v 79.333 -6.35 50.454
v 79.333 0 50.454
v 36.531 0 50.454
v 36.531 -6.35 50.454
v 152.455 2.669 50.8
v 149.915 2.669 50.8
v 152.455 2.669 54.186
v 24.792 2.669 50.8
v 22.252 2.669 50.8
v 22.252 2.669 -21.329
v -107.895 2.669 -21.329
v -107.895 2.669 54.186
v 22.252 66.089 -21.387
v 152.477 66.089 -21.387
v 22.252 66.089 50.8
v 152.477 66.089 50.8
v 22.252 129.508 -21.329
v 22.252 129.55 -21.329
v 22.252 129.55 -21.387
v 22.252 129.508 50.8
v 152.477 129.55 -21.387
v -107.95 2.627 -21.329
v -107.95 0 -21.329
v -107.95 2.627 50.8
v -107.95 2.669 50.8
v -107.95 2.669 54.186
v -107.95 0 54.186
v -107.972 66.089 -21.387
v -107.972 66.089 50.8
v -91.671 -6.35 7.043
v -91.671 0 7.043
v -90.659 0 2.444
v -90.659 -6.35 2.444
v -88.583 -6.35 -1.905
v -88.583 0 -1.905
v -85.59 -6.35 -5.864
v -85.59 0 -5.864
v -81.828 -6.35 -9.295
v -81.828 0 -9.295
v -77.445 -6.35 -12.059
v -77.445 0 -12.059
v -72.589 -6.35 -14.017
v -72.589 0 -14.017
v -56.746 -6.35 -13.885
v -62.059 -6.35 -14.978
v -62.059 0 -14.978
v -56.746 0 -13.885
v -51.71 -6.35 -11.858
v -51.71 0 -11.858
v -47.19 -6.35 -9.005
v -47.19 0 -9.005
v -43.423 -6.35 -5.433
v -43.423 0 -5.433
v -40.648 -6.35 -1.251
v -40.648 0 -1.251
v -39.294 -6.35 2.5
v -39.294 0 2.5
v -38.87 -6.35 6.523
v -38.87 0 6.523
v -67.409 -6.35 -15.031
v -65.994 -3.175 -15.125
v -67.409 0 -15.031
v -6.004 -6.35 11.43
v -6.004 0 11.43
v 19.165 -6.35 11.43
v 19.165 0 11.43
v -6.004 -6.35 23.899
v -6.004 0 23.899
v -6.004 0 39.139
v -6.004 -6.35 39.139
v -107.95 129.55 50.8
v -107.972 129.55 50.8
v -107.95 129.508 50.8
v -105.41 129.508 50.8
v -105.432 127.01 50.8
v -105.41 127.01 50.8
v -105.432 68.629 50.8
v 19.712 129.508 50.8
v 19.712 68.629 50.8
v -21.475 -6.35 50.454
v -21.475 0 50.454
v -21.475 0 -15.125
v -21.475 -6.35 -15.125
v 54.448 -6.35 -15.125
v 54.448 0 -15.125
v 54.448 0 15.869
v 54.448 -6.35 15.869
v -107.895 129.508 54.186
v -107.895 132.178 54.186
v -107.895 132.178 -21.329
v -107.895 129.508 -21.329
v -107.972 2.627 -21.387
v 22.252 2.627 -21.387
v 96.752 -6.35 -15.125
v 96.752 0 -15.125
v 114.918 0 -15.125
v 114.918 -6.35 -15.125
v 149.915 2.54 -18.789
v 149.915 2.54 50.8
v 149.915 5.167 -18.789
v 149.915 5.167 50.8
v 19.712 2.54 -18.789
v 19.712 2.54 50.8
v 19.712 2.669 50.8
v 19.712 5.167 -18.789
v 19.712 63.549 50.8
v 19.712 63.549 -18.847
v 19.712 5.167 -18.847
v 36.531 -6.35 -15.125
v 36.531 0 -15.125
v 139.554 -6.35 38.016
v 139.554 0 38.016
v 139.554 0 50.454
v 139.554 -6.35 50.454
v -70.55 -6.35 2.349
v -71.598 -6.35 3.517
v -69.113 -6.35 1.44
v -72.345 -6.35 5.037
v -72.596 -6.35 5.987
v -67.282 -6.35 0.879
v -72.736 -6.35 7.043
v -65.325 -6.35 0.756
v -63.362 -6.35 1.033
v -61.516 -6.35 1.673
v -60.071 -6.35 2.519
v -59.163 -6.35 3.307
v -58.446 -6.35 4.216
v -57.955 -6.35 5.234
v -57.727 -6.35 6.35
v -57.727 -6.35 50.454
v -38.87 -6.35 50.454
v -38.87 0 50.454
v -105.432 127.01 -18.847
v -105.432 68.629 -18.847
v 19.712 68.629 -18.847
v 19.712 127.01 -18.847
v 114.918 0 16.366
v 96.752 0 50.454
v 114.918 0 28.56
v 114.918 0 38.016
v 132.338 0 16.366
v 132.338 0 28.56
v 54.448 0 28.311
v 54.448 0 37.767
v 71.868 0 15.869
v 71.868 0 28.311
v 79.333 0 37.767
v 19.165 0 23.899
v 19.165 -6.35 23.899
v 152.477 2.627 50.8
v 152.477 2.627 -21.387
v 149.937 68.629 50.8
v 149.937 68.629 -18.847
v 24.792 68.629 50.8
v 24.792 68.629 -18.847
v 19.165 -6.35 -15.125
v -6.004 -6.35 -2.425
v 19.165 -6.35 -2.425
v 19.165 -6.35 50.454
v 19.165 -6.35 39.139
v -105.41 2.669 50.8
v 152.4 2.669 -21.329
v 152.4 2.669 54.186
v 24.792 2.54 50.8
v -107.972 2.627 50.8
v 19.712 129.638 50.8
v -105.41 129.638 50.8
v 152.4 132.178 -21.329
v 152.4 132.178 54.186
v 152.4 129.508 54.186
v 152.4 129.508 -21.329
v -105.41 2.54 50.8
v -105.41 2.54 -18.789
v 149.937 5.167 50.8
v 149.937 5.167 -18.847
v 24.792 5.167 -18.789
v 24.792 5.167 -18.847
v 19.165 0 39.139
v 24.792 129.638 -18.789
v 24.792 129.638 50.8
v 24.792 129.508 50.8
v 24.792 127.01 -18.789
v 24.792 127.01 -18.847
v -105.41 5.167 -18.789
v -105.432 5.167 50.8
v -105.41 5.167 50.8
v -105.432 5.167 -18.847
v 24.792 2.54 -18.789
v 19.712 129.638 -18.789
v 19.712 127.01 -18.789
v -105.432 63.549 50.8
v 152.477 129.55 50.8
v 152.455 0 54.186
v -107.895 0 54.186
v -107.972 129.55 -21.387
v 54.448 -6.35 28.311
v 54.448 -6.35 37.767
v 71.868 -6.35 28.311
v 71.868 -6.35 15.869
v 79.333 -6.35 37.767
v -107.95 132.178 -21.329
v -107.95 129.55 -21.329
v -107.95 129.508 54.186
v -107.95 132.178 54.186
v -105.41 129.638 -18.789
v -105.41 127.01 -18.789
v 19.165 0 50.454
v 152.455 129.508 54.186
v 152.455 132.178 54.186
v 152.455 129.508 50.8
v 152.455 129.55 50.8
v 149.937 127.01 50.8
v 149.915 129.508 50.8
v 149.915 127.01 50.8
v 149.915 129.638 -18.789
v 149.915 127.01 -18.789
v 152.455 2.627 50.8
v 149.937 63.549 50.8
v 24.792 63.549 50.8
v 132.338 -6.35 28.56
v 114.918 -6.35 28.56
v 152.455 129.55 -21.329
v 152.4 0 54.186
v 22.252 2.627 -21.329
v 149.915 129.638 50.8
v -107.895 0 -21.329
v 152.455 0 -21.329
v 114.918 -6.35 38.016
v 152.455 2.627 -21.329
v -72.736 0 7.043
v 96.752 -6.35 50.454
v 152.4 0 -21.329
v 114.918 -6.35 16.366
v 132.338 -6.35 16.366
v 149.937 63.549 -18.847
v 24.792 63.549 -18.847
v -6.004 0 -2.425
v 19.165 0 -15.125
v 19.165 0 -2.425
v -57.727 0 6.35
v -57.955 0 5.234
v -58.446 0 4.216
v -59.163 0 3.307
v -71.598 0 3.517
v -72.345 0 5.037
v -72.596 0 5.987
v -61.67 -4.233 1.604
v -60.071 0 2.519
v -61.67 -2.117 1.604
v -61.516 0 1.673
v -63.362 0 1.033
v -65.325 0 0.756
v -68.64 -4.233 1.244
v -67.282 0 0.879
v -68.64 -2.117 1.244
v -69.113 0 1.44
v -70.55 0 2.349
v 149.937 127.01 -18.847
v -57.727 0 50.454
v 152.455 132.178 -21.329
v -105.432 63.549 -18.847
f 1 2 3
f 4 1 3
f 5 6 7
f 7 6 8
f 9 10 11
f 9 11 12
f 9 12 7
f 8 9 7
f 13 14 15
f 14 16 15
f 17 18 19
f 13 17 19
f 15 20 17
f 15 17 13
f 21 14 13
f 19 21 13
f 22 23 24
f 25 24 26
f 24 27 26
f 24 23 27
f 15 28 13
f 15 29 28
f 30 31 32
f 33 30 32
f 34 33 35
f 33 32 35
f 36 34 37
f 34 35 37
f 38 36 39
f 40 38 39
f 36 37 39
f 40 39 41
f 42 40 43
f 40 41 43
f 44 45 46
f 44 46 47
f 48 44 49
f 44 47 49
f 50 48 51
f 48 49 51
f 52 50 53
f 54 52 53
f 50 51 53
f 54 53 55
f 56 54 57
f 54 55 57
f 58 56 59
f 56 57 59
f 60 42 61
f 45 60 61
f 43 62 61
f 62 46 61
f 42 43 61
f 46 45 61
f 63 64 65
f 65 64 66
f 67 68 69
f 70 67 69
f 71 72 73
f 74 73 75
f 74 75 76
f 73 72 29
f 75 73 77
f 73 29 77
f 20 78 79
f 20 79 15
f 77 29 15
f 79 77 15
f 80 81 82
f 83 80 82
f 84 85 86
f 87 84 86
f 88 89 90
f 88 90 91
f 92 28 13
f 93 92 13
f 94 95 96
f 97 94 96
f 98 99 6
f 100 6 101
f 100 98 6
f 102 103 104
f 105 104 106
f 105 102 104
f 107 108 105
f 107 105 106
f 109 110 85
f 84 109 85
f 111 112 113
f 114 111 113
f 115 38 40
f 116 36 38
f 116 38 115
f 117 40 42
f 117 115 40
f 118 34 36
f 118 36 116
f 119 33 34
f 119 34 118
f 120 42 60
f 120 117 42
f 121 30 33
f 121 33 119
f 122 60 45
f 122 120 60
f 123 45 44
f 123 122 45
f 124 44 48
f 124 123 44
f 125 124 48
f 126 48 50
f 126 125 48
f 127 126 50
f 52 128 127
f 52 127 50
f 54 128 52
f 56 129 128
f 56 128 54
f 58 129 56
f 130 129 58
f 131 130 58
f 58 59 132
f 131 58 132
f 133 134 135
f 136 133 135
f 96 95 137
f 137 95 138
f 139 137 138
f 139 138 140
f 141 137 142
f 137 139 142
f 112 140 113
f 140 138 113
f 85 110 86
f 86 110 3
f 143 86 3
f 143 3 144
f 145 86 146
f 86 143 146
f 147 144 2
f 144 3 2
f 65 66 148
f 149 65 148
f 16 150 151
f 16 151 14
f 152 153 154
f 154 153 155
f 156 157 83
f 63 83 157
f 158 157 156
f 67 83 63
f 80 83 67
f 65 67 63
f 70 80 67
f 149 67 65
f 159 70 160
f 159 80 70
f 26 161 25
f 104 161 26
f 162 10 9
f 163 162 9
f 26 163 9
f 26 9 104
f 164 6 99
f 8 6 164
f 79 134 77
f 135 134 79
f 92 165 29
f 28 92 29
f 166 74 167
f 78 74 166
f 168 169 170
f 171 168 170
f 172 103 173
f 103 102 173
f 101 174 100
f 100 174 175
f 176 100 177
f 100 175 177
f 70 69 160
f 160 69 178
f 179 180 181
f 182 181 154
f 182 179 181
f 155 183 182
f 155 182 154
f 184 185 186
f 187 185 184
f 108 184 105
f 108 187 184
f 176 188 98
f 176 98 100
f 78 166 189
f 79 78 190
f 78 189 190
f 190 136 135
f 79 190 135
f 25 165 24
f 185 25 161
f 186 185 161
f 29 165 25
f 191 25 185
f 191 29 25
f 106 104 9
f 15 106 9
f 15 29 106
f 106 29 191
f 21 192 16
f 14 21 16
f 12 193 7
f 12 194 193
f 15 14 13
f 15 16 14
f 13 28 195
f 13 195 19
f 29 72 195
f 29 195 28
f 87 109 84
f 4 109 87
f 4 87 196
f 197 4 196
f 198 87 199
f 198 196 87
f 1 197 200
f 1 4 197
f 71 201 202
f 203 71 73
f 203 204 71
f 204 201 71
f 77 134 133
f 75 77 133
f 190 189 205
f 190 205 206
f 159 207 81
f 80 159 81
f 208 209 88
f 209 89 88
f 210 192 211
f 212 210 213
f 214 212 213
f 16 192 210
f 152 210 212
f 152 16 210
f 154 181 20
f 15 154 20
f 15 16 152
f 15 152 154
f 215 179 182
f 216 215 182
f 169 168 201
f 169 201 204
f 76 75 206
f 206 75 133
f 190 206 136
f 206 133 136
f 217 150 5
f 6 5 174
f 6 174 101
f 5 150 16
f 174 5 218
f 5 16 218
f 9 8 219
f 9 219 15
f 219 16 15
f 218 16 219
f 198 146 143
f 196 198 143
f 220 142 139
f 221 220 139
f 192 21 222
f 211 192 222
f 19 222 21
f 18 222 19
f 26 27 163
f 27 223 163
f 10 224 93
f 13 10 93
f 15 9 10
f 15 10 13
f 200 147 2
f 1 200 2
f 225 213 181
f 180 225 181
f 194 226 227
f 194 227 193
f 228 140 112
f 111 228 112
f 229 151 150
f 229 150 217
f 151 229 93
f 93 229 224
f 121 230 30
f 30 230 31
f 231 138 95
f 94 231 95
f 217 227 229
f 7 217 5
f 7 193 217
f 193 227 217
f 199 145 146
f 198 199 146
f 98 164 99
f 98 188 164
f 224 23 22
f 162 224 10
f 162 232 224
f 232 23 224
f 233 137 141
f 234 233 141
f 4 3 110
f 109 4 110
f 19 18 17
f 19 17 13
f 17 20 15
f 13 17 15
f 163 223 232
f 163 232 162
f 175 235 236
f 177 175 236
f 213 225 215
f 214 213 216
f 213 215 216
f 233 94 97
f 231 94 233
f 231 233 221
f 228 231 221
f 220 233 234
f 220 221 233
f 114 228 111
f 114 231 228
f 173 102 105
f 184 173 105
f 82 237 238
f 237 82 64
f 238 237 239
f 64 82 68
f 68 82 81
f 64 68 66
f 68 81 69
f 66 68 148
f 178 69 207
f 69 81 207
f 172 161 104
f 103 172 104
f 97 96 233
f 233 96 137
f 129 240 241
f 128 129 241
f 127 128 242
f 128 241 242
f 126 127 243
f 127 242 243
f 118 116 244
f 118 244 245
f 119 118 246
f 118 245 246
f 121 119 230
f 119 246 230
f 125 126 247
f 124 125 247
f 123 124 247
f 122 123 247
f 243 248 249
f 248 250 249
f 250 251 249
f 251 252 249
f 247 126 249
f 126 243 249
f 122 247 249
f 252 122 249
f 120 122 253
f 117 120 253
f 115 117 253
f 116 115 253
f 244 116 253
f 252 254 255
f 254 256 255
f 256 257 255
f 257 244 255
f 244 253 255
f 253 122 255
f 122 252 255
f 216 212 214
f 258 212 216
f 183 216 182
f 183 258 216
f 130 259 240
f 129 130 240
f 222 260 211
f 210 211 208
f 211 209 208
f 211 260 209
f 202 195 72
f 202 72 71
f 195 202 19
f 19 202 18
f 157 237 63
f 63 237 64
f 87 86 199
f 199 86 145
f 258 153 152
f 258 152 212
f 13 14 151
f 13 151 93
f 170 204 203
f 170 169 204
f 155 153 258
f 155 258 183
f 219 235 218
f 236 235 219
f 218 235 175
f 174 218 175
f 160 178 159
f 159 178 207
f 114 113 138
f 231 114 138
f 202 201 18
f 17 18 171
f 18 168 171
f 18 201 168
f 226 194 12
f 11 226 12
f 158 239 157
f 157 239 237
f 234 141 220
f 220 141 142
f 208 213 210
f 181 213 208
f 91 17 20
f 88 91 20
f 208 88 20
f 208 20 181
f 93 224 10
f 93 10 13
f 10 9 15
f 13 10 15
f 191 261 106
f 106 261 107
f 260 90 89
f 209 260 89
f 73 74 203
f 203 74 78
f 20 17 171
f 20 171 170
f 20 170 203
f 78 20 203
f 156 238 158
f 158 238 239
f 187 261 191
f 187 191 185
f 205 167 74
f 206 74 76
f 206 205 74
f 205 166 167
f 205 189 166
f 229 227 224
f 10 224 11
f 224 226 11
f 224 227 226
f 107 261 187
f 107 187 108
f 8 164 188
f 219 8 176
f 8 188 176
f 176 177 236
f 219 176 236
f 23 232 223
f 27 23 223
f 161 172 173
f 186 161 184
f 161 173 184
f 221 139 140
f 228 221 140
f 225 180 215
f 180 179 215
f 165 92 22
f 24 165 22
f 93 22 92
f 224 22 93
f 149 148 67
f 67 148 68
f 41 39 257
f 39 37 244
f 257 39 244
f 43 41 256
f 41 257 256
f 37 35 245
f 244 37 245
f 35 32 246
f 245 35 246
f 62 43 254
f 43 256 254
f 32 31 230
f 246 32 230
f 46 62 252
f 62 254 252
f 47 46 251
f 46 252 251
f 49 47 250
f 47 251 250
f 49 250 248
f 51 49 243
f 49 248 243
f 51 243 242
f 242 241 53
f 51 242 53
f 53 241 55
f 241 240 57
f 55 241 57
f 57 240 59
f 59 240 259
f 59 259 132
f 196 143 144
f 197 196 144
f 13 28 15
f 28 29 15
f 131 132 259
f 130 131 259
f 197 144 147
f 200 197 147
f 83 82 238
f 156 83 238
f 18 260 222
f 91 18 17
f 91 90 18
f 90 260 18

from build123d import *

# Parameters (mm, degrees)
F1_DEPTH      = 6.35
F2_W          = 2.6693828404
F2_H          = 75.5151826888
F3_DEPTH      = 152.4
F3_DEPTH_BACK = 107.95
F4_W          = 130.2241440862
F4_H          = 63.4616059251
F5_DEPTH      = 50.8
F6_DEPTH      = 21.3868
F7_T          = -2.54


# Not quite as in the source:
# - a shell that OpenCascade refuses in one call is made with other operations: the cavity is built on its own and cut out


with BuildPart() as f1:
    # F0 (on Front) → F1 (new body)
    with BuildSketch(Plane.XZ):
        with BuildLine():
            Line((-57.7272735536, 50.4536367953), (-57.7272735536, 49.0681789815))
            Line((-57.7272735536, 49.0681789815), (-57.7272735536, 6.3500003889))
            add(Edge.make_bspline(
                [(-57.7272735536, 6.3500003889), (-58.1890903413, 0), (-72.0436349511, -2.4245455861), (-72.7363601327, 7.0427274331)],
                knots=[0, 0, 0, 0, 15.0250640829, 15.0250640829, 15.0250640829, 15.0250640829], degree=3))
            Line((-72.7363601327, 7.0427274331), (-91.6709080338, 7.0427274331))
            add(Edge.make_bspline(
                [(-91.6709080338, 7.0427274331), (-90.6300544739, -4.2879367247), (-67.0665278584, -25.1007612075), (-38.6208631098, -6.0298712924), (-38.8697087765, 6.5230050582)],
                knots=[0, 0, 0, 0, 0.4971511298, 1, 1, 1, 1], degree=3))
            Line((-38.8697087765, 6.5230050582), (-38.8697087765, 50.4536367953))
            Line((-38.8697087765, 50.4536367953), (-57.7272735536, 50.4536367953))
        make_face()
    extrude(amount=F1_DEPTH)


with BuildPart() as f1b:
    # F0 (on Front) → F1, piece 2 (new body)
    with BuildSketch(Plane.XZ):
        Polygon((-21.4745458215, 50.4536367953), (-21.4745458215, -15.1245463639), (19.1654544324, -15.1245463639), (19.1654544324, -2.4245455861), (-6.0036364011, -2.4245455861), (-6.0036364011, 11.4300008863), (19.1654544324, 11.4300008863), (19.1654544324, 23.899089545), (-6.0036364011, 23.899089545), (-6.0036364011, 39.1390919685), (19.1654544324, 39.1390919685), (19.1654544324, 50.4536367953), align=None)
    extrude(amount=F1_DEPTH)


with BuildPart() as f1c:
    # F0 (on Front) → F1, piece 3 (new body)
    with BuildSketch(Plane.XZ):
        Polygon((36.5311764181, 50.4536367953), (36.5311764181, -15.1245463639), (54.4482171535, -15.1245463639), (54.4482171535, 15.868736431), (71.8675628304, 15.868736431), (71.8675628304, 28.3111259341), (54.4482171535, 28.3111259341), (54.4482171535, 37.7673432231), (79.3329998851, 37.7673432231), (79.3329998851, 50.4536367953), align=None)
    extrude(amount=F1_DEPTH)


with BuildPart() as f1d:
    # F0 (on Front) → F1, piece 4 (new body)
    with BuildSketch(Plane.XZ):
        Polygon((139.5541727543, 50.4536367953), (96.752345562, 50.4536367953), (96.752345562, -15.1245463639), (114.9182394147, -15.1245463639), (114.9182394147, 16.3664314896), (132.3375850916, 16.3664314896), (132.3375850916, 28.5599734634), (114.9182394147, 28.5599734634), (114.9182394147, 38.0161888897), (139.5541727543, 38.0161888897), align=None)
    extrude(amount=F1_DEPTH)


with BuildPart() as f3:
    # F2 (on Right) → F3 (new body, two sides)
    with BuildSketch(Plane.YZ) as f3_sk:
        with Locations((1.3346914202, 16.4288422093)):
            Rectangle(F2_W, F2_H)
    extrude(amount=F3_DEPTH)
    extrude(f3_sk.sketch, amount=-F3_DEPTH_BACK)

    # F4 (on Top) → F5 (join)
    with BuildSketch(Plane.XY):
        with Locations((-42.8596409038, 34.3579554465)):
            Rectangle(F4_W, F4_H)
    extrude(amount=F5_DEPTH)

    # F4 (on Top) → F6 (join)
    with BuildSketch(Plane.XY):
        with Locations((-42.8596409038, 34.3579554465)):
            Rectangle(F4_W, F4_H)
    extrude(amount=-F6_DEPTH)

    # F7: a shell. OpenCascade refuses it in one call, so the cavity is built on its own and cut out:
    # the body offset inwards by the wall thickness, plus a prism from it out through each open face.
    f7_core = offset(f3.part, amount=F7_T, kind=Kind.INTERSECTION, mode=Mode.PRIVATE)
    f7_exits = [f7_core.faces().sort_by_distance(p)[0] for p in [
        (-42.859173, 33.044597, 48.26),
    ]]
    add(f7_core, mode=Mode.SUBTRACT)
    extrude(f7_exits, amount=-F7_T, mode=Mode.SUBTRACT)


with BuildPart() as f8_1:
    # F8: instance of F3
    add(f3.part.mirror(Plane(origin=(22.2524311393, 34.3790536331, 14.7065806878), x_dir=(0, 1, 0), z_dir=(1, 0, 0))))


with BuildPart() as f9_1:
    # F9: instance of F8_1
    add(f8_1.part.mirror(Plane(origin=(87.3645031825, 66.088758409, 14.7066), x_dir=(-1, 0, 0), z_dir=(0, 1, 0))))


with BuildPart() as f9_2:
    # F9: instance of F3
    add(f3.part.mirror(Plane(origin=(87.3645031825, 66.088758409, 14.7066), x_dir=(-1, 0, 0), z_dir=(0, 1, 0))))


solid = Compound([f1.part, f1b.part, f1c.part, f1d.part, f3.part, f8_1.part, f9_1.part, f9_2.part])
